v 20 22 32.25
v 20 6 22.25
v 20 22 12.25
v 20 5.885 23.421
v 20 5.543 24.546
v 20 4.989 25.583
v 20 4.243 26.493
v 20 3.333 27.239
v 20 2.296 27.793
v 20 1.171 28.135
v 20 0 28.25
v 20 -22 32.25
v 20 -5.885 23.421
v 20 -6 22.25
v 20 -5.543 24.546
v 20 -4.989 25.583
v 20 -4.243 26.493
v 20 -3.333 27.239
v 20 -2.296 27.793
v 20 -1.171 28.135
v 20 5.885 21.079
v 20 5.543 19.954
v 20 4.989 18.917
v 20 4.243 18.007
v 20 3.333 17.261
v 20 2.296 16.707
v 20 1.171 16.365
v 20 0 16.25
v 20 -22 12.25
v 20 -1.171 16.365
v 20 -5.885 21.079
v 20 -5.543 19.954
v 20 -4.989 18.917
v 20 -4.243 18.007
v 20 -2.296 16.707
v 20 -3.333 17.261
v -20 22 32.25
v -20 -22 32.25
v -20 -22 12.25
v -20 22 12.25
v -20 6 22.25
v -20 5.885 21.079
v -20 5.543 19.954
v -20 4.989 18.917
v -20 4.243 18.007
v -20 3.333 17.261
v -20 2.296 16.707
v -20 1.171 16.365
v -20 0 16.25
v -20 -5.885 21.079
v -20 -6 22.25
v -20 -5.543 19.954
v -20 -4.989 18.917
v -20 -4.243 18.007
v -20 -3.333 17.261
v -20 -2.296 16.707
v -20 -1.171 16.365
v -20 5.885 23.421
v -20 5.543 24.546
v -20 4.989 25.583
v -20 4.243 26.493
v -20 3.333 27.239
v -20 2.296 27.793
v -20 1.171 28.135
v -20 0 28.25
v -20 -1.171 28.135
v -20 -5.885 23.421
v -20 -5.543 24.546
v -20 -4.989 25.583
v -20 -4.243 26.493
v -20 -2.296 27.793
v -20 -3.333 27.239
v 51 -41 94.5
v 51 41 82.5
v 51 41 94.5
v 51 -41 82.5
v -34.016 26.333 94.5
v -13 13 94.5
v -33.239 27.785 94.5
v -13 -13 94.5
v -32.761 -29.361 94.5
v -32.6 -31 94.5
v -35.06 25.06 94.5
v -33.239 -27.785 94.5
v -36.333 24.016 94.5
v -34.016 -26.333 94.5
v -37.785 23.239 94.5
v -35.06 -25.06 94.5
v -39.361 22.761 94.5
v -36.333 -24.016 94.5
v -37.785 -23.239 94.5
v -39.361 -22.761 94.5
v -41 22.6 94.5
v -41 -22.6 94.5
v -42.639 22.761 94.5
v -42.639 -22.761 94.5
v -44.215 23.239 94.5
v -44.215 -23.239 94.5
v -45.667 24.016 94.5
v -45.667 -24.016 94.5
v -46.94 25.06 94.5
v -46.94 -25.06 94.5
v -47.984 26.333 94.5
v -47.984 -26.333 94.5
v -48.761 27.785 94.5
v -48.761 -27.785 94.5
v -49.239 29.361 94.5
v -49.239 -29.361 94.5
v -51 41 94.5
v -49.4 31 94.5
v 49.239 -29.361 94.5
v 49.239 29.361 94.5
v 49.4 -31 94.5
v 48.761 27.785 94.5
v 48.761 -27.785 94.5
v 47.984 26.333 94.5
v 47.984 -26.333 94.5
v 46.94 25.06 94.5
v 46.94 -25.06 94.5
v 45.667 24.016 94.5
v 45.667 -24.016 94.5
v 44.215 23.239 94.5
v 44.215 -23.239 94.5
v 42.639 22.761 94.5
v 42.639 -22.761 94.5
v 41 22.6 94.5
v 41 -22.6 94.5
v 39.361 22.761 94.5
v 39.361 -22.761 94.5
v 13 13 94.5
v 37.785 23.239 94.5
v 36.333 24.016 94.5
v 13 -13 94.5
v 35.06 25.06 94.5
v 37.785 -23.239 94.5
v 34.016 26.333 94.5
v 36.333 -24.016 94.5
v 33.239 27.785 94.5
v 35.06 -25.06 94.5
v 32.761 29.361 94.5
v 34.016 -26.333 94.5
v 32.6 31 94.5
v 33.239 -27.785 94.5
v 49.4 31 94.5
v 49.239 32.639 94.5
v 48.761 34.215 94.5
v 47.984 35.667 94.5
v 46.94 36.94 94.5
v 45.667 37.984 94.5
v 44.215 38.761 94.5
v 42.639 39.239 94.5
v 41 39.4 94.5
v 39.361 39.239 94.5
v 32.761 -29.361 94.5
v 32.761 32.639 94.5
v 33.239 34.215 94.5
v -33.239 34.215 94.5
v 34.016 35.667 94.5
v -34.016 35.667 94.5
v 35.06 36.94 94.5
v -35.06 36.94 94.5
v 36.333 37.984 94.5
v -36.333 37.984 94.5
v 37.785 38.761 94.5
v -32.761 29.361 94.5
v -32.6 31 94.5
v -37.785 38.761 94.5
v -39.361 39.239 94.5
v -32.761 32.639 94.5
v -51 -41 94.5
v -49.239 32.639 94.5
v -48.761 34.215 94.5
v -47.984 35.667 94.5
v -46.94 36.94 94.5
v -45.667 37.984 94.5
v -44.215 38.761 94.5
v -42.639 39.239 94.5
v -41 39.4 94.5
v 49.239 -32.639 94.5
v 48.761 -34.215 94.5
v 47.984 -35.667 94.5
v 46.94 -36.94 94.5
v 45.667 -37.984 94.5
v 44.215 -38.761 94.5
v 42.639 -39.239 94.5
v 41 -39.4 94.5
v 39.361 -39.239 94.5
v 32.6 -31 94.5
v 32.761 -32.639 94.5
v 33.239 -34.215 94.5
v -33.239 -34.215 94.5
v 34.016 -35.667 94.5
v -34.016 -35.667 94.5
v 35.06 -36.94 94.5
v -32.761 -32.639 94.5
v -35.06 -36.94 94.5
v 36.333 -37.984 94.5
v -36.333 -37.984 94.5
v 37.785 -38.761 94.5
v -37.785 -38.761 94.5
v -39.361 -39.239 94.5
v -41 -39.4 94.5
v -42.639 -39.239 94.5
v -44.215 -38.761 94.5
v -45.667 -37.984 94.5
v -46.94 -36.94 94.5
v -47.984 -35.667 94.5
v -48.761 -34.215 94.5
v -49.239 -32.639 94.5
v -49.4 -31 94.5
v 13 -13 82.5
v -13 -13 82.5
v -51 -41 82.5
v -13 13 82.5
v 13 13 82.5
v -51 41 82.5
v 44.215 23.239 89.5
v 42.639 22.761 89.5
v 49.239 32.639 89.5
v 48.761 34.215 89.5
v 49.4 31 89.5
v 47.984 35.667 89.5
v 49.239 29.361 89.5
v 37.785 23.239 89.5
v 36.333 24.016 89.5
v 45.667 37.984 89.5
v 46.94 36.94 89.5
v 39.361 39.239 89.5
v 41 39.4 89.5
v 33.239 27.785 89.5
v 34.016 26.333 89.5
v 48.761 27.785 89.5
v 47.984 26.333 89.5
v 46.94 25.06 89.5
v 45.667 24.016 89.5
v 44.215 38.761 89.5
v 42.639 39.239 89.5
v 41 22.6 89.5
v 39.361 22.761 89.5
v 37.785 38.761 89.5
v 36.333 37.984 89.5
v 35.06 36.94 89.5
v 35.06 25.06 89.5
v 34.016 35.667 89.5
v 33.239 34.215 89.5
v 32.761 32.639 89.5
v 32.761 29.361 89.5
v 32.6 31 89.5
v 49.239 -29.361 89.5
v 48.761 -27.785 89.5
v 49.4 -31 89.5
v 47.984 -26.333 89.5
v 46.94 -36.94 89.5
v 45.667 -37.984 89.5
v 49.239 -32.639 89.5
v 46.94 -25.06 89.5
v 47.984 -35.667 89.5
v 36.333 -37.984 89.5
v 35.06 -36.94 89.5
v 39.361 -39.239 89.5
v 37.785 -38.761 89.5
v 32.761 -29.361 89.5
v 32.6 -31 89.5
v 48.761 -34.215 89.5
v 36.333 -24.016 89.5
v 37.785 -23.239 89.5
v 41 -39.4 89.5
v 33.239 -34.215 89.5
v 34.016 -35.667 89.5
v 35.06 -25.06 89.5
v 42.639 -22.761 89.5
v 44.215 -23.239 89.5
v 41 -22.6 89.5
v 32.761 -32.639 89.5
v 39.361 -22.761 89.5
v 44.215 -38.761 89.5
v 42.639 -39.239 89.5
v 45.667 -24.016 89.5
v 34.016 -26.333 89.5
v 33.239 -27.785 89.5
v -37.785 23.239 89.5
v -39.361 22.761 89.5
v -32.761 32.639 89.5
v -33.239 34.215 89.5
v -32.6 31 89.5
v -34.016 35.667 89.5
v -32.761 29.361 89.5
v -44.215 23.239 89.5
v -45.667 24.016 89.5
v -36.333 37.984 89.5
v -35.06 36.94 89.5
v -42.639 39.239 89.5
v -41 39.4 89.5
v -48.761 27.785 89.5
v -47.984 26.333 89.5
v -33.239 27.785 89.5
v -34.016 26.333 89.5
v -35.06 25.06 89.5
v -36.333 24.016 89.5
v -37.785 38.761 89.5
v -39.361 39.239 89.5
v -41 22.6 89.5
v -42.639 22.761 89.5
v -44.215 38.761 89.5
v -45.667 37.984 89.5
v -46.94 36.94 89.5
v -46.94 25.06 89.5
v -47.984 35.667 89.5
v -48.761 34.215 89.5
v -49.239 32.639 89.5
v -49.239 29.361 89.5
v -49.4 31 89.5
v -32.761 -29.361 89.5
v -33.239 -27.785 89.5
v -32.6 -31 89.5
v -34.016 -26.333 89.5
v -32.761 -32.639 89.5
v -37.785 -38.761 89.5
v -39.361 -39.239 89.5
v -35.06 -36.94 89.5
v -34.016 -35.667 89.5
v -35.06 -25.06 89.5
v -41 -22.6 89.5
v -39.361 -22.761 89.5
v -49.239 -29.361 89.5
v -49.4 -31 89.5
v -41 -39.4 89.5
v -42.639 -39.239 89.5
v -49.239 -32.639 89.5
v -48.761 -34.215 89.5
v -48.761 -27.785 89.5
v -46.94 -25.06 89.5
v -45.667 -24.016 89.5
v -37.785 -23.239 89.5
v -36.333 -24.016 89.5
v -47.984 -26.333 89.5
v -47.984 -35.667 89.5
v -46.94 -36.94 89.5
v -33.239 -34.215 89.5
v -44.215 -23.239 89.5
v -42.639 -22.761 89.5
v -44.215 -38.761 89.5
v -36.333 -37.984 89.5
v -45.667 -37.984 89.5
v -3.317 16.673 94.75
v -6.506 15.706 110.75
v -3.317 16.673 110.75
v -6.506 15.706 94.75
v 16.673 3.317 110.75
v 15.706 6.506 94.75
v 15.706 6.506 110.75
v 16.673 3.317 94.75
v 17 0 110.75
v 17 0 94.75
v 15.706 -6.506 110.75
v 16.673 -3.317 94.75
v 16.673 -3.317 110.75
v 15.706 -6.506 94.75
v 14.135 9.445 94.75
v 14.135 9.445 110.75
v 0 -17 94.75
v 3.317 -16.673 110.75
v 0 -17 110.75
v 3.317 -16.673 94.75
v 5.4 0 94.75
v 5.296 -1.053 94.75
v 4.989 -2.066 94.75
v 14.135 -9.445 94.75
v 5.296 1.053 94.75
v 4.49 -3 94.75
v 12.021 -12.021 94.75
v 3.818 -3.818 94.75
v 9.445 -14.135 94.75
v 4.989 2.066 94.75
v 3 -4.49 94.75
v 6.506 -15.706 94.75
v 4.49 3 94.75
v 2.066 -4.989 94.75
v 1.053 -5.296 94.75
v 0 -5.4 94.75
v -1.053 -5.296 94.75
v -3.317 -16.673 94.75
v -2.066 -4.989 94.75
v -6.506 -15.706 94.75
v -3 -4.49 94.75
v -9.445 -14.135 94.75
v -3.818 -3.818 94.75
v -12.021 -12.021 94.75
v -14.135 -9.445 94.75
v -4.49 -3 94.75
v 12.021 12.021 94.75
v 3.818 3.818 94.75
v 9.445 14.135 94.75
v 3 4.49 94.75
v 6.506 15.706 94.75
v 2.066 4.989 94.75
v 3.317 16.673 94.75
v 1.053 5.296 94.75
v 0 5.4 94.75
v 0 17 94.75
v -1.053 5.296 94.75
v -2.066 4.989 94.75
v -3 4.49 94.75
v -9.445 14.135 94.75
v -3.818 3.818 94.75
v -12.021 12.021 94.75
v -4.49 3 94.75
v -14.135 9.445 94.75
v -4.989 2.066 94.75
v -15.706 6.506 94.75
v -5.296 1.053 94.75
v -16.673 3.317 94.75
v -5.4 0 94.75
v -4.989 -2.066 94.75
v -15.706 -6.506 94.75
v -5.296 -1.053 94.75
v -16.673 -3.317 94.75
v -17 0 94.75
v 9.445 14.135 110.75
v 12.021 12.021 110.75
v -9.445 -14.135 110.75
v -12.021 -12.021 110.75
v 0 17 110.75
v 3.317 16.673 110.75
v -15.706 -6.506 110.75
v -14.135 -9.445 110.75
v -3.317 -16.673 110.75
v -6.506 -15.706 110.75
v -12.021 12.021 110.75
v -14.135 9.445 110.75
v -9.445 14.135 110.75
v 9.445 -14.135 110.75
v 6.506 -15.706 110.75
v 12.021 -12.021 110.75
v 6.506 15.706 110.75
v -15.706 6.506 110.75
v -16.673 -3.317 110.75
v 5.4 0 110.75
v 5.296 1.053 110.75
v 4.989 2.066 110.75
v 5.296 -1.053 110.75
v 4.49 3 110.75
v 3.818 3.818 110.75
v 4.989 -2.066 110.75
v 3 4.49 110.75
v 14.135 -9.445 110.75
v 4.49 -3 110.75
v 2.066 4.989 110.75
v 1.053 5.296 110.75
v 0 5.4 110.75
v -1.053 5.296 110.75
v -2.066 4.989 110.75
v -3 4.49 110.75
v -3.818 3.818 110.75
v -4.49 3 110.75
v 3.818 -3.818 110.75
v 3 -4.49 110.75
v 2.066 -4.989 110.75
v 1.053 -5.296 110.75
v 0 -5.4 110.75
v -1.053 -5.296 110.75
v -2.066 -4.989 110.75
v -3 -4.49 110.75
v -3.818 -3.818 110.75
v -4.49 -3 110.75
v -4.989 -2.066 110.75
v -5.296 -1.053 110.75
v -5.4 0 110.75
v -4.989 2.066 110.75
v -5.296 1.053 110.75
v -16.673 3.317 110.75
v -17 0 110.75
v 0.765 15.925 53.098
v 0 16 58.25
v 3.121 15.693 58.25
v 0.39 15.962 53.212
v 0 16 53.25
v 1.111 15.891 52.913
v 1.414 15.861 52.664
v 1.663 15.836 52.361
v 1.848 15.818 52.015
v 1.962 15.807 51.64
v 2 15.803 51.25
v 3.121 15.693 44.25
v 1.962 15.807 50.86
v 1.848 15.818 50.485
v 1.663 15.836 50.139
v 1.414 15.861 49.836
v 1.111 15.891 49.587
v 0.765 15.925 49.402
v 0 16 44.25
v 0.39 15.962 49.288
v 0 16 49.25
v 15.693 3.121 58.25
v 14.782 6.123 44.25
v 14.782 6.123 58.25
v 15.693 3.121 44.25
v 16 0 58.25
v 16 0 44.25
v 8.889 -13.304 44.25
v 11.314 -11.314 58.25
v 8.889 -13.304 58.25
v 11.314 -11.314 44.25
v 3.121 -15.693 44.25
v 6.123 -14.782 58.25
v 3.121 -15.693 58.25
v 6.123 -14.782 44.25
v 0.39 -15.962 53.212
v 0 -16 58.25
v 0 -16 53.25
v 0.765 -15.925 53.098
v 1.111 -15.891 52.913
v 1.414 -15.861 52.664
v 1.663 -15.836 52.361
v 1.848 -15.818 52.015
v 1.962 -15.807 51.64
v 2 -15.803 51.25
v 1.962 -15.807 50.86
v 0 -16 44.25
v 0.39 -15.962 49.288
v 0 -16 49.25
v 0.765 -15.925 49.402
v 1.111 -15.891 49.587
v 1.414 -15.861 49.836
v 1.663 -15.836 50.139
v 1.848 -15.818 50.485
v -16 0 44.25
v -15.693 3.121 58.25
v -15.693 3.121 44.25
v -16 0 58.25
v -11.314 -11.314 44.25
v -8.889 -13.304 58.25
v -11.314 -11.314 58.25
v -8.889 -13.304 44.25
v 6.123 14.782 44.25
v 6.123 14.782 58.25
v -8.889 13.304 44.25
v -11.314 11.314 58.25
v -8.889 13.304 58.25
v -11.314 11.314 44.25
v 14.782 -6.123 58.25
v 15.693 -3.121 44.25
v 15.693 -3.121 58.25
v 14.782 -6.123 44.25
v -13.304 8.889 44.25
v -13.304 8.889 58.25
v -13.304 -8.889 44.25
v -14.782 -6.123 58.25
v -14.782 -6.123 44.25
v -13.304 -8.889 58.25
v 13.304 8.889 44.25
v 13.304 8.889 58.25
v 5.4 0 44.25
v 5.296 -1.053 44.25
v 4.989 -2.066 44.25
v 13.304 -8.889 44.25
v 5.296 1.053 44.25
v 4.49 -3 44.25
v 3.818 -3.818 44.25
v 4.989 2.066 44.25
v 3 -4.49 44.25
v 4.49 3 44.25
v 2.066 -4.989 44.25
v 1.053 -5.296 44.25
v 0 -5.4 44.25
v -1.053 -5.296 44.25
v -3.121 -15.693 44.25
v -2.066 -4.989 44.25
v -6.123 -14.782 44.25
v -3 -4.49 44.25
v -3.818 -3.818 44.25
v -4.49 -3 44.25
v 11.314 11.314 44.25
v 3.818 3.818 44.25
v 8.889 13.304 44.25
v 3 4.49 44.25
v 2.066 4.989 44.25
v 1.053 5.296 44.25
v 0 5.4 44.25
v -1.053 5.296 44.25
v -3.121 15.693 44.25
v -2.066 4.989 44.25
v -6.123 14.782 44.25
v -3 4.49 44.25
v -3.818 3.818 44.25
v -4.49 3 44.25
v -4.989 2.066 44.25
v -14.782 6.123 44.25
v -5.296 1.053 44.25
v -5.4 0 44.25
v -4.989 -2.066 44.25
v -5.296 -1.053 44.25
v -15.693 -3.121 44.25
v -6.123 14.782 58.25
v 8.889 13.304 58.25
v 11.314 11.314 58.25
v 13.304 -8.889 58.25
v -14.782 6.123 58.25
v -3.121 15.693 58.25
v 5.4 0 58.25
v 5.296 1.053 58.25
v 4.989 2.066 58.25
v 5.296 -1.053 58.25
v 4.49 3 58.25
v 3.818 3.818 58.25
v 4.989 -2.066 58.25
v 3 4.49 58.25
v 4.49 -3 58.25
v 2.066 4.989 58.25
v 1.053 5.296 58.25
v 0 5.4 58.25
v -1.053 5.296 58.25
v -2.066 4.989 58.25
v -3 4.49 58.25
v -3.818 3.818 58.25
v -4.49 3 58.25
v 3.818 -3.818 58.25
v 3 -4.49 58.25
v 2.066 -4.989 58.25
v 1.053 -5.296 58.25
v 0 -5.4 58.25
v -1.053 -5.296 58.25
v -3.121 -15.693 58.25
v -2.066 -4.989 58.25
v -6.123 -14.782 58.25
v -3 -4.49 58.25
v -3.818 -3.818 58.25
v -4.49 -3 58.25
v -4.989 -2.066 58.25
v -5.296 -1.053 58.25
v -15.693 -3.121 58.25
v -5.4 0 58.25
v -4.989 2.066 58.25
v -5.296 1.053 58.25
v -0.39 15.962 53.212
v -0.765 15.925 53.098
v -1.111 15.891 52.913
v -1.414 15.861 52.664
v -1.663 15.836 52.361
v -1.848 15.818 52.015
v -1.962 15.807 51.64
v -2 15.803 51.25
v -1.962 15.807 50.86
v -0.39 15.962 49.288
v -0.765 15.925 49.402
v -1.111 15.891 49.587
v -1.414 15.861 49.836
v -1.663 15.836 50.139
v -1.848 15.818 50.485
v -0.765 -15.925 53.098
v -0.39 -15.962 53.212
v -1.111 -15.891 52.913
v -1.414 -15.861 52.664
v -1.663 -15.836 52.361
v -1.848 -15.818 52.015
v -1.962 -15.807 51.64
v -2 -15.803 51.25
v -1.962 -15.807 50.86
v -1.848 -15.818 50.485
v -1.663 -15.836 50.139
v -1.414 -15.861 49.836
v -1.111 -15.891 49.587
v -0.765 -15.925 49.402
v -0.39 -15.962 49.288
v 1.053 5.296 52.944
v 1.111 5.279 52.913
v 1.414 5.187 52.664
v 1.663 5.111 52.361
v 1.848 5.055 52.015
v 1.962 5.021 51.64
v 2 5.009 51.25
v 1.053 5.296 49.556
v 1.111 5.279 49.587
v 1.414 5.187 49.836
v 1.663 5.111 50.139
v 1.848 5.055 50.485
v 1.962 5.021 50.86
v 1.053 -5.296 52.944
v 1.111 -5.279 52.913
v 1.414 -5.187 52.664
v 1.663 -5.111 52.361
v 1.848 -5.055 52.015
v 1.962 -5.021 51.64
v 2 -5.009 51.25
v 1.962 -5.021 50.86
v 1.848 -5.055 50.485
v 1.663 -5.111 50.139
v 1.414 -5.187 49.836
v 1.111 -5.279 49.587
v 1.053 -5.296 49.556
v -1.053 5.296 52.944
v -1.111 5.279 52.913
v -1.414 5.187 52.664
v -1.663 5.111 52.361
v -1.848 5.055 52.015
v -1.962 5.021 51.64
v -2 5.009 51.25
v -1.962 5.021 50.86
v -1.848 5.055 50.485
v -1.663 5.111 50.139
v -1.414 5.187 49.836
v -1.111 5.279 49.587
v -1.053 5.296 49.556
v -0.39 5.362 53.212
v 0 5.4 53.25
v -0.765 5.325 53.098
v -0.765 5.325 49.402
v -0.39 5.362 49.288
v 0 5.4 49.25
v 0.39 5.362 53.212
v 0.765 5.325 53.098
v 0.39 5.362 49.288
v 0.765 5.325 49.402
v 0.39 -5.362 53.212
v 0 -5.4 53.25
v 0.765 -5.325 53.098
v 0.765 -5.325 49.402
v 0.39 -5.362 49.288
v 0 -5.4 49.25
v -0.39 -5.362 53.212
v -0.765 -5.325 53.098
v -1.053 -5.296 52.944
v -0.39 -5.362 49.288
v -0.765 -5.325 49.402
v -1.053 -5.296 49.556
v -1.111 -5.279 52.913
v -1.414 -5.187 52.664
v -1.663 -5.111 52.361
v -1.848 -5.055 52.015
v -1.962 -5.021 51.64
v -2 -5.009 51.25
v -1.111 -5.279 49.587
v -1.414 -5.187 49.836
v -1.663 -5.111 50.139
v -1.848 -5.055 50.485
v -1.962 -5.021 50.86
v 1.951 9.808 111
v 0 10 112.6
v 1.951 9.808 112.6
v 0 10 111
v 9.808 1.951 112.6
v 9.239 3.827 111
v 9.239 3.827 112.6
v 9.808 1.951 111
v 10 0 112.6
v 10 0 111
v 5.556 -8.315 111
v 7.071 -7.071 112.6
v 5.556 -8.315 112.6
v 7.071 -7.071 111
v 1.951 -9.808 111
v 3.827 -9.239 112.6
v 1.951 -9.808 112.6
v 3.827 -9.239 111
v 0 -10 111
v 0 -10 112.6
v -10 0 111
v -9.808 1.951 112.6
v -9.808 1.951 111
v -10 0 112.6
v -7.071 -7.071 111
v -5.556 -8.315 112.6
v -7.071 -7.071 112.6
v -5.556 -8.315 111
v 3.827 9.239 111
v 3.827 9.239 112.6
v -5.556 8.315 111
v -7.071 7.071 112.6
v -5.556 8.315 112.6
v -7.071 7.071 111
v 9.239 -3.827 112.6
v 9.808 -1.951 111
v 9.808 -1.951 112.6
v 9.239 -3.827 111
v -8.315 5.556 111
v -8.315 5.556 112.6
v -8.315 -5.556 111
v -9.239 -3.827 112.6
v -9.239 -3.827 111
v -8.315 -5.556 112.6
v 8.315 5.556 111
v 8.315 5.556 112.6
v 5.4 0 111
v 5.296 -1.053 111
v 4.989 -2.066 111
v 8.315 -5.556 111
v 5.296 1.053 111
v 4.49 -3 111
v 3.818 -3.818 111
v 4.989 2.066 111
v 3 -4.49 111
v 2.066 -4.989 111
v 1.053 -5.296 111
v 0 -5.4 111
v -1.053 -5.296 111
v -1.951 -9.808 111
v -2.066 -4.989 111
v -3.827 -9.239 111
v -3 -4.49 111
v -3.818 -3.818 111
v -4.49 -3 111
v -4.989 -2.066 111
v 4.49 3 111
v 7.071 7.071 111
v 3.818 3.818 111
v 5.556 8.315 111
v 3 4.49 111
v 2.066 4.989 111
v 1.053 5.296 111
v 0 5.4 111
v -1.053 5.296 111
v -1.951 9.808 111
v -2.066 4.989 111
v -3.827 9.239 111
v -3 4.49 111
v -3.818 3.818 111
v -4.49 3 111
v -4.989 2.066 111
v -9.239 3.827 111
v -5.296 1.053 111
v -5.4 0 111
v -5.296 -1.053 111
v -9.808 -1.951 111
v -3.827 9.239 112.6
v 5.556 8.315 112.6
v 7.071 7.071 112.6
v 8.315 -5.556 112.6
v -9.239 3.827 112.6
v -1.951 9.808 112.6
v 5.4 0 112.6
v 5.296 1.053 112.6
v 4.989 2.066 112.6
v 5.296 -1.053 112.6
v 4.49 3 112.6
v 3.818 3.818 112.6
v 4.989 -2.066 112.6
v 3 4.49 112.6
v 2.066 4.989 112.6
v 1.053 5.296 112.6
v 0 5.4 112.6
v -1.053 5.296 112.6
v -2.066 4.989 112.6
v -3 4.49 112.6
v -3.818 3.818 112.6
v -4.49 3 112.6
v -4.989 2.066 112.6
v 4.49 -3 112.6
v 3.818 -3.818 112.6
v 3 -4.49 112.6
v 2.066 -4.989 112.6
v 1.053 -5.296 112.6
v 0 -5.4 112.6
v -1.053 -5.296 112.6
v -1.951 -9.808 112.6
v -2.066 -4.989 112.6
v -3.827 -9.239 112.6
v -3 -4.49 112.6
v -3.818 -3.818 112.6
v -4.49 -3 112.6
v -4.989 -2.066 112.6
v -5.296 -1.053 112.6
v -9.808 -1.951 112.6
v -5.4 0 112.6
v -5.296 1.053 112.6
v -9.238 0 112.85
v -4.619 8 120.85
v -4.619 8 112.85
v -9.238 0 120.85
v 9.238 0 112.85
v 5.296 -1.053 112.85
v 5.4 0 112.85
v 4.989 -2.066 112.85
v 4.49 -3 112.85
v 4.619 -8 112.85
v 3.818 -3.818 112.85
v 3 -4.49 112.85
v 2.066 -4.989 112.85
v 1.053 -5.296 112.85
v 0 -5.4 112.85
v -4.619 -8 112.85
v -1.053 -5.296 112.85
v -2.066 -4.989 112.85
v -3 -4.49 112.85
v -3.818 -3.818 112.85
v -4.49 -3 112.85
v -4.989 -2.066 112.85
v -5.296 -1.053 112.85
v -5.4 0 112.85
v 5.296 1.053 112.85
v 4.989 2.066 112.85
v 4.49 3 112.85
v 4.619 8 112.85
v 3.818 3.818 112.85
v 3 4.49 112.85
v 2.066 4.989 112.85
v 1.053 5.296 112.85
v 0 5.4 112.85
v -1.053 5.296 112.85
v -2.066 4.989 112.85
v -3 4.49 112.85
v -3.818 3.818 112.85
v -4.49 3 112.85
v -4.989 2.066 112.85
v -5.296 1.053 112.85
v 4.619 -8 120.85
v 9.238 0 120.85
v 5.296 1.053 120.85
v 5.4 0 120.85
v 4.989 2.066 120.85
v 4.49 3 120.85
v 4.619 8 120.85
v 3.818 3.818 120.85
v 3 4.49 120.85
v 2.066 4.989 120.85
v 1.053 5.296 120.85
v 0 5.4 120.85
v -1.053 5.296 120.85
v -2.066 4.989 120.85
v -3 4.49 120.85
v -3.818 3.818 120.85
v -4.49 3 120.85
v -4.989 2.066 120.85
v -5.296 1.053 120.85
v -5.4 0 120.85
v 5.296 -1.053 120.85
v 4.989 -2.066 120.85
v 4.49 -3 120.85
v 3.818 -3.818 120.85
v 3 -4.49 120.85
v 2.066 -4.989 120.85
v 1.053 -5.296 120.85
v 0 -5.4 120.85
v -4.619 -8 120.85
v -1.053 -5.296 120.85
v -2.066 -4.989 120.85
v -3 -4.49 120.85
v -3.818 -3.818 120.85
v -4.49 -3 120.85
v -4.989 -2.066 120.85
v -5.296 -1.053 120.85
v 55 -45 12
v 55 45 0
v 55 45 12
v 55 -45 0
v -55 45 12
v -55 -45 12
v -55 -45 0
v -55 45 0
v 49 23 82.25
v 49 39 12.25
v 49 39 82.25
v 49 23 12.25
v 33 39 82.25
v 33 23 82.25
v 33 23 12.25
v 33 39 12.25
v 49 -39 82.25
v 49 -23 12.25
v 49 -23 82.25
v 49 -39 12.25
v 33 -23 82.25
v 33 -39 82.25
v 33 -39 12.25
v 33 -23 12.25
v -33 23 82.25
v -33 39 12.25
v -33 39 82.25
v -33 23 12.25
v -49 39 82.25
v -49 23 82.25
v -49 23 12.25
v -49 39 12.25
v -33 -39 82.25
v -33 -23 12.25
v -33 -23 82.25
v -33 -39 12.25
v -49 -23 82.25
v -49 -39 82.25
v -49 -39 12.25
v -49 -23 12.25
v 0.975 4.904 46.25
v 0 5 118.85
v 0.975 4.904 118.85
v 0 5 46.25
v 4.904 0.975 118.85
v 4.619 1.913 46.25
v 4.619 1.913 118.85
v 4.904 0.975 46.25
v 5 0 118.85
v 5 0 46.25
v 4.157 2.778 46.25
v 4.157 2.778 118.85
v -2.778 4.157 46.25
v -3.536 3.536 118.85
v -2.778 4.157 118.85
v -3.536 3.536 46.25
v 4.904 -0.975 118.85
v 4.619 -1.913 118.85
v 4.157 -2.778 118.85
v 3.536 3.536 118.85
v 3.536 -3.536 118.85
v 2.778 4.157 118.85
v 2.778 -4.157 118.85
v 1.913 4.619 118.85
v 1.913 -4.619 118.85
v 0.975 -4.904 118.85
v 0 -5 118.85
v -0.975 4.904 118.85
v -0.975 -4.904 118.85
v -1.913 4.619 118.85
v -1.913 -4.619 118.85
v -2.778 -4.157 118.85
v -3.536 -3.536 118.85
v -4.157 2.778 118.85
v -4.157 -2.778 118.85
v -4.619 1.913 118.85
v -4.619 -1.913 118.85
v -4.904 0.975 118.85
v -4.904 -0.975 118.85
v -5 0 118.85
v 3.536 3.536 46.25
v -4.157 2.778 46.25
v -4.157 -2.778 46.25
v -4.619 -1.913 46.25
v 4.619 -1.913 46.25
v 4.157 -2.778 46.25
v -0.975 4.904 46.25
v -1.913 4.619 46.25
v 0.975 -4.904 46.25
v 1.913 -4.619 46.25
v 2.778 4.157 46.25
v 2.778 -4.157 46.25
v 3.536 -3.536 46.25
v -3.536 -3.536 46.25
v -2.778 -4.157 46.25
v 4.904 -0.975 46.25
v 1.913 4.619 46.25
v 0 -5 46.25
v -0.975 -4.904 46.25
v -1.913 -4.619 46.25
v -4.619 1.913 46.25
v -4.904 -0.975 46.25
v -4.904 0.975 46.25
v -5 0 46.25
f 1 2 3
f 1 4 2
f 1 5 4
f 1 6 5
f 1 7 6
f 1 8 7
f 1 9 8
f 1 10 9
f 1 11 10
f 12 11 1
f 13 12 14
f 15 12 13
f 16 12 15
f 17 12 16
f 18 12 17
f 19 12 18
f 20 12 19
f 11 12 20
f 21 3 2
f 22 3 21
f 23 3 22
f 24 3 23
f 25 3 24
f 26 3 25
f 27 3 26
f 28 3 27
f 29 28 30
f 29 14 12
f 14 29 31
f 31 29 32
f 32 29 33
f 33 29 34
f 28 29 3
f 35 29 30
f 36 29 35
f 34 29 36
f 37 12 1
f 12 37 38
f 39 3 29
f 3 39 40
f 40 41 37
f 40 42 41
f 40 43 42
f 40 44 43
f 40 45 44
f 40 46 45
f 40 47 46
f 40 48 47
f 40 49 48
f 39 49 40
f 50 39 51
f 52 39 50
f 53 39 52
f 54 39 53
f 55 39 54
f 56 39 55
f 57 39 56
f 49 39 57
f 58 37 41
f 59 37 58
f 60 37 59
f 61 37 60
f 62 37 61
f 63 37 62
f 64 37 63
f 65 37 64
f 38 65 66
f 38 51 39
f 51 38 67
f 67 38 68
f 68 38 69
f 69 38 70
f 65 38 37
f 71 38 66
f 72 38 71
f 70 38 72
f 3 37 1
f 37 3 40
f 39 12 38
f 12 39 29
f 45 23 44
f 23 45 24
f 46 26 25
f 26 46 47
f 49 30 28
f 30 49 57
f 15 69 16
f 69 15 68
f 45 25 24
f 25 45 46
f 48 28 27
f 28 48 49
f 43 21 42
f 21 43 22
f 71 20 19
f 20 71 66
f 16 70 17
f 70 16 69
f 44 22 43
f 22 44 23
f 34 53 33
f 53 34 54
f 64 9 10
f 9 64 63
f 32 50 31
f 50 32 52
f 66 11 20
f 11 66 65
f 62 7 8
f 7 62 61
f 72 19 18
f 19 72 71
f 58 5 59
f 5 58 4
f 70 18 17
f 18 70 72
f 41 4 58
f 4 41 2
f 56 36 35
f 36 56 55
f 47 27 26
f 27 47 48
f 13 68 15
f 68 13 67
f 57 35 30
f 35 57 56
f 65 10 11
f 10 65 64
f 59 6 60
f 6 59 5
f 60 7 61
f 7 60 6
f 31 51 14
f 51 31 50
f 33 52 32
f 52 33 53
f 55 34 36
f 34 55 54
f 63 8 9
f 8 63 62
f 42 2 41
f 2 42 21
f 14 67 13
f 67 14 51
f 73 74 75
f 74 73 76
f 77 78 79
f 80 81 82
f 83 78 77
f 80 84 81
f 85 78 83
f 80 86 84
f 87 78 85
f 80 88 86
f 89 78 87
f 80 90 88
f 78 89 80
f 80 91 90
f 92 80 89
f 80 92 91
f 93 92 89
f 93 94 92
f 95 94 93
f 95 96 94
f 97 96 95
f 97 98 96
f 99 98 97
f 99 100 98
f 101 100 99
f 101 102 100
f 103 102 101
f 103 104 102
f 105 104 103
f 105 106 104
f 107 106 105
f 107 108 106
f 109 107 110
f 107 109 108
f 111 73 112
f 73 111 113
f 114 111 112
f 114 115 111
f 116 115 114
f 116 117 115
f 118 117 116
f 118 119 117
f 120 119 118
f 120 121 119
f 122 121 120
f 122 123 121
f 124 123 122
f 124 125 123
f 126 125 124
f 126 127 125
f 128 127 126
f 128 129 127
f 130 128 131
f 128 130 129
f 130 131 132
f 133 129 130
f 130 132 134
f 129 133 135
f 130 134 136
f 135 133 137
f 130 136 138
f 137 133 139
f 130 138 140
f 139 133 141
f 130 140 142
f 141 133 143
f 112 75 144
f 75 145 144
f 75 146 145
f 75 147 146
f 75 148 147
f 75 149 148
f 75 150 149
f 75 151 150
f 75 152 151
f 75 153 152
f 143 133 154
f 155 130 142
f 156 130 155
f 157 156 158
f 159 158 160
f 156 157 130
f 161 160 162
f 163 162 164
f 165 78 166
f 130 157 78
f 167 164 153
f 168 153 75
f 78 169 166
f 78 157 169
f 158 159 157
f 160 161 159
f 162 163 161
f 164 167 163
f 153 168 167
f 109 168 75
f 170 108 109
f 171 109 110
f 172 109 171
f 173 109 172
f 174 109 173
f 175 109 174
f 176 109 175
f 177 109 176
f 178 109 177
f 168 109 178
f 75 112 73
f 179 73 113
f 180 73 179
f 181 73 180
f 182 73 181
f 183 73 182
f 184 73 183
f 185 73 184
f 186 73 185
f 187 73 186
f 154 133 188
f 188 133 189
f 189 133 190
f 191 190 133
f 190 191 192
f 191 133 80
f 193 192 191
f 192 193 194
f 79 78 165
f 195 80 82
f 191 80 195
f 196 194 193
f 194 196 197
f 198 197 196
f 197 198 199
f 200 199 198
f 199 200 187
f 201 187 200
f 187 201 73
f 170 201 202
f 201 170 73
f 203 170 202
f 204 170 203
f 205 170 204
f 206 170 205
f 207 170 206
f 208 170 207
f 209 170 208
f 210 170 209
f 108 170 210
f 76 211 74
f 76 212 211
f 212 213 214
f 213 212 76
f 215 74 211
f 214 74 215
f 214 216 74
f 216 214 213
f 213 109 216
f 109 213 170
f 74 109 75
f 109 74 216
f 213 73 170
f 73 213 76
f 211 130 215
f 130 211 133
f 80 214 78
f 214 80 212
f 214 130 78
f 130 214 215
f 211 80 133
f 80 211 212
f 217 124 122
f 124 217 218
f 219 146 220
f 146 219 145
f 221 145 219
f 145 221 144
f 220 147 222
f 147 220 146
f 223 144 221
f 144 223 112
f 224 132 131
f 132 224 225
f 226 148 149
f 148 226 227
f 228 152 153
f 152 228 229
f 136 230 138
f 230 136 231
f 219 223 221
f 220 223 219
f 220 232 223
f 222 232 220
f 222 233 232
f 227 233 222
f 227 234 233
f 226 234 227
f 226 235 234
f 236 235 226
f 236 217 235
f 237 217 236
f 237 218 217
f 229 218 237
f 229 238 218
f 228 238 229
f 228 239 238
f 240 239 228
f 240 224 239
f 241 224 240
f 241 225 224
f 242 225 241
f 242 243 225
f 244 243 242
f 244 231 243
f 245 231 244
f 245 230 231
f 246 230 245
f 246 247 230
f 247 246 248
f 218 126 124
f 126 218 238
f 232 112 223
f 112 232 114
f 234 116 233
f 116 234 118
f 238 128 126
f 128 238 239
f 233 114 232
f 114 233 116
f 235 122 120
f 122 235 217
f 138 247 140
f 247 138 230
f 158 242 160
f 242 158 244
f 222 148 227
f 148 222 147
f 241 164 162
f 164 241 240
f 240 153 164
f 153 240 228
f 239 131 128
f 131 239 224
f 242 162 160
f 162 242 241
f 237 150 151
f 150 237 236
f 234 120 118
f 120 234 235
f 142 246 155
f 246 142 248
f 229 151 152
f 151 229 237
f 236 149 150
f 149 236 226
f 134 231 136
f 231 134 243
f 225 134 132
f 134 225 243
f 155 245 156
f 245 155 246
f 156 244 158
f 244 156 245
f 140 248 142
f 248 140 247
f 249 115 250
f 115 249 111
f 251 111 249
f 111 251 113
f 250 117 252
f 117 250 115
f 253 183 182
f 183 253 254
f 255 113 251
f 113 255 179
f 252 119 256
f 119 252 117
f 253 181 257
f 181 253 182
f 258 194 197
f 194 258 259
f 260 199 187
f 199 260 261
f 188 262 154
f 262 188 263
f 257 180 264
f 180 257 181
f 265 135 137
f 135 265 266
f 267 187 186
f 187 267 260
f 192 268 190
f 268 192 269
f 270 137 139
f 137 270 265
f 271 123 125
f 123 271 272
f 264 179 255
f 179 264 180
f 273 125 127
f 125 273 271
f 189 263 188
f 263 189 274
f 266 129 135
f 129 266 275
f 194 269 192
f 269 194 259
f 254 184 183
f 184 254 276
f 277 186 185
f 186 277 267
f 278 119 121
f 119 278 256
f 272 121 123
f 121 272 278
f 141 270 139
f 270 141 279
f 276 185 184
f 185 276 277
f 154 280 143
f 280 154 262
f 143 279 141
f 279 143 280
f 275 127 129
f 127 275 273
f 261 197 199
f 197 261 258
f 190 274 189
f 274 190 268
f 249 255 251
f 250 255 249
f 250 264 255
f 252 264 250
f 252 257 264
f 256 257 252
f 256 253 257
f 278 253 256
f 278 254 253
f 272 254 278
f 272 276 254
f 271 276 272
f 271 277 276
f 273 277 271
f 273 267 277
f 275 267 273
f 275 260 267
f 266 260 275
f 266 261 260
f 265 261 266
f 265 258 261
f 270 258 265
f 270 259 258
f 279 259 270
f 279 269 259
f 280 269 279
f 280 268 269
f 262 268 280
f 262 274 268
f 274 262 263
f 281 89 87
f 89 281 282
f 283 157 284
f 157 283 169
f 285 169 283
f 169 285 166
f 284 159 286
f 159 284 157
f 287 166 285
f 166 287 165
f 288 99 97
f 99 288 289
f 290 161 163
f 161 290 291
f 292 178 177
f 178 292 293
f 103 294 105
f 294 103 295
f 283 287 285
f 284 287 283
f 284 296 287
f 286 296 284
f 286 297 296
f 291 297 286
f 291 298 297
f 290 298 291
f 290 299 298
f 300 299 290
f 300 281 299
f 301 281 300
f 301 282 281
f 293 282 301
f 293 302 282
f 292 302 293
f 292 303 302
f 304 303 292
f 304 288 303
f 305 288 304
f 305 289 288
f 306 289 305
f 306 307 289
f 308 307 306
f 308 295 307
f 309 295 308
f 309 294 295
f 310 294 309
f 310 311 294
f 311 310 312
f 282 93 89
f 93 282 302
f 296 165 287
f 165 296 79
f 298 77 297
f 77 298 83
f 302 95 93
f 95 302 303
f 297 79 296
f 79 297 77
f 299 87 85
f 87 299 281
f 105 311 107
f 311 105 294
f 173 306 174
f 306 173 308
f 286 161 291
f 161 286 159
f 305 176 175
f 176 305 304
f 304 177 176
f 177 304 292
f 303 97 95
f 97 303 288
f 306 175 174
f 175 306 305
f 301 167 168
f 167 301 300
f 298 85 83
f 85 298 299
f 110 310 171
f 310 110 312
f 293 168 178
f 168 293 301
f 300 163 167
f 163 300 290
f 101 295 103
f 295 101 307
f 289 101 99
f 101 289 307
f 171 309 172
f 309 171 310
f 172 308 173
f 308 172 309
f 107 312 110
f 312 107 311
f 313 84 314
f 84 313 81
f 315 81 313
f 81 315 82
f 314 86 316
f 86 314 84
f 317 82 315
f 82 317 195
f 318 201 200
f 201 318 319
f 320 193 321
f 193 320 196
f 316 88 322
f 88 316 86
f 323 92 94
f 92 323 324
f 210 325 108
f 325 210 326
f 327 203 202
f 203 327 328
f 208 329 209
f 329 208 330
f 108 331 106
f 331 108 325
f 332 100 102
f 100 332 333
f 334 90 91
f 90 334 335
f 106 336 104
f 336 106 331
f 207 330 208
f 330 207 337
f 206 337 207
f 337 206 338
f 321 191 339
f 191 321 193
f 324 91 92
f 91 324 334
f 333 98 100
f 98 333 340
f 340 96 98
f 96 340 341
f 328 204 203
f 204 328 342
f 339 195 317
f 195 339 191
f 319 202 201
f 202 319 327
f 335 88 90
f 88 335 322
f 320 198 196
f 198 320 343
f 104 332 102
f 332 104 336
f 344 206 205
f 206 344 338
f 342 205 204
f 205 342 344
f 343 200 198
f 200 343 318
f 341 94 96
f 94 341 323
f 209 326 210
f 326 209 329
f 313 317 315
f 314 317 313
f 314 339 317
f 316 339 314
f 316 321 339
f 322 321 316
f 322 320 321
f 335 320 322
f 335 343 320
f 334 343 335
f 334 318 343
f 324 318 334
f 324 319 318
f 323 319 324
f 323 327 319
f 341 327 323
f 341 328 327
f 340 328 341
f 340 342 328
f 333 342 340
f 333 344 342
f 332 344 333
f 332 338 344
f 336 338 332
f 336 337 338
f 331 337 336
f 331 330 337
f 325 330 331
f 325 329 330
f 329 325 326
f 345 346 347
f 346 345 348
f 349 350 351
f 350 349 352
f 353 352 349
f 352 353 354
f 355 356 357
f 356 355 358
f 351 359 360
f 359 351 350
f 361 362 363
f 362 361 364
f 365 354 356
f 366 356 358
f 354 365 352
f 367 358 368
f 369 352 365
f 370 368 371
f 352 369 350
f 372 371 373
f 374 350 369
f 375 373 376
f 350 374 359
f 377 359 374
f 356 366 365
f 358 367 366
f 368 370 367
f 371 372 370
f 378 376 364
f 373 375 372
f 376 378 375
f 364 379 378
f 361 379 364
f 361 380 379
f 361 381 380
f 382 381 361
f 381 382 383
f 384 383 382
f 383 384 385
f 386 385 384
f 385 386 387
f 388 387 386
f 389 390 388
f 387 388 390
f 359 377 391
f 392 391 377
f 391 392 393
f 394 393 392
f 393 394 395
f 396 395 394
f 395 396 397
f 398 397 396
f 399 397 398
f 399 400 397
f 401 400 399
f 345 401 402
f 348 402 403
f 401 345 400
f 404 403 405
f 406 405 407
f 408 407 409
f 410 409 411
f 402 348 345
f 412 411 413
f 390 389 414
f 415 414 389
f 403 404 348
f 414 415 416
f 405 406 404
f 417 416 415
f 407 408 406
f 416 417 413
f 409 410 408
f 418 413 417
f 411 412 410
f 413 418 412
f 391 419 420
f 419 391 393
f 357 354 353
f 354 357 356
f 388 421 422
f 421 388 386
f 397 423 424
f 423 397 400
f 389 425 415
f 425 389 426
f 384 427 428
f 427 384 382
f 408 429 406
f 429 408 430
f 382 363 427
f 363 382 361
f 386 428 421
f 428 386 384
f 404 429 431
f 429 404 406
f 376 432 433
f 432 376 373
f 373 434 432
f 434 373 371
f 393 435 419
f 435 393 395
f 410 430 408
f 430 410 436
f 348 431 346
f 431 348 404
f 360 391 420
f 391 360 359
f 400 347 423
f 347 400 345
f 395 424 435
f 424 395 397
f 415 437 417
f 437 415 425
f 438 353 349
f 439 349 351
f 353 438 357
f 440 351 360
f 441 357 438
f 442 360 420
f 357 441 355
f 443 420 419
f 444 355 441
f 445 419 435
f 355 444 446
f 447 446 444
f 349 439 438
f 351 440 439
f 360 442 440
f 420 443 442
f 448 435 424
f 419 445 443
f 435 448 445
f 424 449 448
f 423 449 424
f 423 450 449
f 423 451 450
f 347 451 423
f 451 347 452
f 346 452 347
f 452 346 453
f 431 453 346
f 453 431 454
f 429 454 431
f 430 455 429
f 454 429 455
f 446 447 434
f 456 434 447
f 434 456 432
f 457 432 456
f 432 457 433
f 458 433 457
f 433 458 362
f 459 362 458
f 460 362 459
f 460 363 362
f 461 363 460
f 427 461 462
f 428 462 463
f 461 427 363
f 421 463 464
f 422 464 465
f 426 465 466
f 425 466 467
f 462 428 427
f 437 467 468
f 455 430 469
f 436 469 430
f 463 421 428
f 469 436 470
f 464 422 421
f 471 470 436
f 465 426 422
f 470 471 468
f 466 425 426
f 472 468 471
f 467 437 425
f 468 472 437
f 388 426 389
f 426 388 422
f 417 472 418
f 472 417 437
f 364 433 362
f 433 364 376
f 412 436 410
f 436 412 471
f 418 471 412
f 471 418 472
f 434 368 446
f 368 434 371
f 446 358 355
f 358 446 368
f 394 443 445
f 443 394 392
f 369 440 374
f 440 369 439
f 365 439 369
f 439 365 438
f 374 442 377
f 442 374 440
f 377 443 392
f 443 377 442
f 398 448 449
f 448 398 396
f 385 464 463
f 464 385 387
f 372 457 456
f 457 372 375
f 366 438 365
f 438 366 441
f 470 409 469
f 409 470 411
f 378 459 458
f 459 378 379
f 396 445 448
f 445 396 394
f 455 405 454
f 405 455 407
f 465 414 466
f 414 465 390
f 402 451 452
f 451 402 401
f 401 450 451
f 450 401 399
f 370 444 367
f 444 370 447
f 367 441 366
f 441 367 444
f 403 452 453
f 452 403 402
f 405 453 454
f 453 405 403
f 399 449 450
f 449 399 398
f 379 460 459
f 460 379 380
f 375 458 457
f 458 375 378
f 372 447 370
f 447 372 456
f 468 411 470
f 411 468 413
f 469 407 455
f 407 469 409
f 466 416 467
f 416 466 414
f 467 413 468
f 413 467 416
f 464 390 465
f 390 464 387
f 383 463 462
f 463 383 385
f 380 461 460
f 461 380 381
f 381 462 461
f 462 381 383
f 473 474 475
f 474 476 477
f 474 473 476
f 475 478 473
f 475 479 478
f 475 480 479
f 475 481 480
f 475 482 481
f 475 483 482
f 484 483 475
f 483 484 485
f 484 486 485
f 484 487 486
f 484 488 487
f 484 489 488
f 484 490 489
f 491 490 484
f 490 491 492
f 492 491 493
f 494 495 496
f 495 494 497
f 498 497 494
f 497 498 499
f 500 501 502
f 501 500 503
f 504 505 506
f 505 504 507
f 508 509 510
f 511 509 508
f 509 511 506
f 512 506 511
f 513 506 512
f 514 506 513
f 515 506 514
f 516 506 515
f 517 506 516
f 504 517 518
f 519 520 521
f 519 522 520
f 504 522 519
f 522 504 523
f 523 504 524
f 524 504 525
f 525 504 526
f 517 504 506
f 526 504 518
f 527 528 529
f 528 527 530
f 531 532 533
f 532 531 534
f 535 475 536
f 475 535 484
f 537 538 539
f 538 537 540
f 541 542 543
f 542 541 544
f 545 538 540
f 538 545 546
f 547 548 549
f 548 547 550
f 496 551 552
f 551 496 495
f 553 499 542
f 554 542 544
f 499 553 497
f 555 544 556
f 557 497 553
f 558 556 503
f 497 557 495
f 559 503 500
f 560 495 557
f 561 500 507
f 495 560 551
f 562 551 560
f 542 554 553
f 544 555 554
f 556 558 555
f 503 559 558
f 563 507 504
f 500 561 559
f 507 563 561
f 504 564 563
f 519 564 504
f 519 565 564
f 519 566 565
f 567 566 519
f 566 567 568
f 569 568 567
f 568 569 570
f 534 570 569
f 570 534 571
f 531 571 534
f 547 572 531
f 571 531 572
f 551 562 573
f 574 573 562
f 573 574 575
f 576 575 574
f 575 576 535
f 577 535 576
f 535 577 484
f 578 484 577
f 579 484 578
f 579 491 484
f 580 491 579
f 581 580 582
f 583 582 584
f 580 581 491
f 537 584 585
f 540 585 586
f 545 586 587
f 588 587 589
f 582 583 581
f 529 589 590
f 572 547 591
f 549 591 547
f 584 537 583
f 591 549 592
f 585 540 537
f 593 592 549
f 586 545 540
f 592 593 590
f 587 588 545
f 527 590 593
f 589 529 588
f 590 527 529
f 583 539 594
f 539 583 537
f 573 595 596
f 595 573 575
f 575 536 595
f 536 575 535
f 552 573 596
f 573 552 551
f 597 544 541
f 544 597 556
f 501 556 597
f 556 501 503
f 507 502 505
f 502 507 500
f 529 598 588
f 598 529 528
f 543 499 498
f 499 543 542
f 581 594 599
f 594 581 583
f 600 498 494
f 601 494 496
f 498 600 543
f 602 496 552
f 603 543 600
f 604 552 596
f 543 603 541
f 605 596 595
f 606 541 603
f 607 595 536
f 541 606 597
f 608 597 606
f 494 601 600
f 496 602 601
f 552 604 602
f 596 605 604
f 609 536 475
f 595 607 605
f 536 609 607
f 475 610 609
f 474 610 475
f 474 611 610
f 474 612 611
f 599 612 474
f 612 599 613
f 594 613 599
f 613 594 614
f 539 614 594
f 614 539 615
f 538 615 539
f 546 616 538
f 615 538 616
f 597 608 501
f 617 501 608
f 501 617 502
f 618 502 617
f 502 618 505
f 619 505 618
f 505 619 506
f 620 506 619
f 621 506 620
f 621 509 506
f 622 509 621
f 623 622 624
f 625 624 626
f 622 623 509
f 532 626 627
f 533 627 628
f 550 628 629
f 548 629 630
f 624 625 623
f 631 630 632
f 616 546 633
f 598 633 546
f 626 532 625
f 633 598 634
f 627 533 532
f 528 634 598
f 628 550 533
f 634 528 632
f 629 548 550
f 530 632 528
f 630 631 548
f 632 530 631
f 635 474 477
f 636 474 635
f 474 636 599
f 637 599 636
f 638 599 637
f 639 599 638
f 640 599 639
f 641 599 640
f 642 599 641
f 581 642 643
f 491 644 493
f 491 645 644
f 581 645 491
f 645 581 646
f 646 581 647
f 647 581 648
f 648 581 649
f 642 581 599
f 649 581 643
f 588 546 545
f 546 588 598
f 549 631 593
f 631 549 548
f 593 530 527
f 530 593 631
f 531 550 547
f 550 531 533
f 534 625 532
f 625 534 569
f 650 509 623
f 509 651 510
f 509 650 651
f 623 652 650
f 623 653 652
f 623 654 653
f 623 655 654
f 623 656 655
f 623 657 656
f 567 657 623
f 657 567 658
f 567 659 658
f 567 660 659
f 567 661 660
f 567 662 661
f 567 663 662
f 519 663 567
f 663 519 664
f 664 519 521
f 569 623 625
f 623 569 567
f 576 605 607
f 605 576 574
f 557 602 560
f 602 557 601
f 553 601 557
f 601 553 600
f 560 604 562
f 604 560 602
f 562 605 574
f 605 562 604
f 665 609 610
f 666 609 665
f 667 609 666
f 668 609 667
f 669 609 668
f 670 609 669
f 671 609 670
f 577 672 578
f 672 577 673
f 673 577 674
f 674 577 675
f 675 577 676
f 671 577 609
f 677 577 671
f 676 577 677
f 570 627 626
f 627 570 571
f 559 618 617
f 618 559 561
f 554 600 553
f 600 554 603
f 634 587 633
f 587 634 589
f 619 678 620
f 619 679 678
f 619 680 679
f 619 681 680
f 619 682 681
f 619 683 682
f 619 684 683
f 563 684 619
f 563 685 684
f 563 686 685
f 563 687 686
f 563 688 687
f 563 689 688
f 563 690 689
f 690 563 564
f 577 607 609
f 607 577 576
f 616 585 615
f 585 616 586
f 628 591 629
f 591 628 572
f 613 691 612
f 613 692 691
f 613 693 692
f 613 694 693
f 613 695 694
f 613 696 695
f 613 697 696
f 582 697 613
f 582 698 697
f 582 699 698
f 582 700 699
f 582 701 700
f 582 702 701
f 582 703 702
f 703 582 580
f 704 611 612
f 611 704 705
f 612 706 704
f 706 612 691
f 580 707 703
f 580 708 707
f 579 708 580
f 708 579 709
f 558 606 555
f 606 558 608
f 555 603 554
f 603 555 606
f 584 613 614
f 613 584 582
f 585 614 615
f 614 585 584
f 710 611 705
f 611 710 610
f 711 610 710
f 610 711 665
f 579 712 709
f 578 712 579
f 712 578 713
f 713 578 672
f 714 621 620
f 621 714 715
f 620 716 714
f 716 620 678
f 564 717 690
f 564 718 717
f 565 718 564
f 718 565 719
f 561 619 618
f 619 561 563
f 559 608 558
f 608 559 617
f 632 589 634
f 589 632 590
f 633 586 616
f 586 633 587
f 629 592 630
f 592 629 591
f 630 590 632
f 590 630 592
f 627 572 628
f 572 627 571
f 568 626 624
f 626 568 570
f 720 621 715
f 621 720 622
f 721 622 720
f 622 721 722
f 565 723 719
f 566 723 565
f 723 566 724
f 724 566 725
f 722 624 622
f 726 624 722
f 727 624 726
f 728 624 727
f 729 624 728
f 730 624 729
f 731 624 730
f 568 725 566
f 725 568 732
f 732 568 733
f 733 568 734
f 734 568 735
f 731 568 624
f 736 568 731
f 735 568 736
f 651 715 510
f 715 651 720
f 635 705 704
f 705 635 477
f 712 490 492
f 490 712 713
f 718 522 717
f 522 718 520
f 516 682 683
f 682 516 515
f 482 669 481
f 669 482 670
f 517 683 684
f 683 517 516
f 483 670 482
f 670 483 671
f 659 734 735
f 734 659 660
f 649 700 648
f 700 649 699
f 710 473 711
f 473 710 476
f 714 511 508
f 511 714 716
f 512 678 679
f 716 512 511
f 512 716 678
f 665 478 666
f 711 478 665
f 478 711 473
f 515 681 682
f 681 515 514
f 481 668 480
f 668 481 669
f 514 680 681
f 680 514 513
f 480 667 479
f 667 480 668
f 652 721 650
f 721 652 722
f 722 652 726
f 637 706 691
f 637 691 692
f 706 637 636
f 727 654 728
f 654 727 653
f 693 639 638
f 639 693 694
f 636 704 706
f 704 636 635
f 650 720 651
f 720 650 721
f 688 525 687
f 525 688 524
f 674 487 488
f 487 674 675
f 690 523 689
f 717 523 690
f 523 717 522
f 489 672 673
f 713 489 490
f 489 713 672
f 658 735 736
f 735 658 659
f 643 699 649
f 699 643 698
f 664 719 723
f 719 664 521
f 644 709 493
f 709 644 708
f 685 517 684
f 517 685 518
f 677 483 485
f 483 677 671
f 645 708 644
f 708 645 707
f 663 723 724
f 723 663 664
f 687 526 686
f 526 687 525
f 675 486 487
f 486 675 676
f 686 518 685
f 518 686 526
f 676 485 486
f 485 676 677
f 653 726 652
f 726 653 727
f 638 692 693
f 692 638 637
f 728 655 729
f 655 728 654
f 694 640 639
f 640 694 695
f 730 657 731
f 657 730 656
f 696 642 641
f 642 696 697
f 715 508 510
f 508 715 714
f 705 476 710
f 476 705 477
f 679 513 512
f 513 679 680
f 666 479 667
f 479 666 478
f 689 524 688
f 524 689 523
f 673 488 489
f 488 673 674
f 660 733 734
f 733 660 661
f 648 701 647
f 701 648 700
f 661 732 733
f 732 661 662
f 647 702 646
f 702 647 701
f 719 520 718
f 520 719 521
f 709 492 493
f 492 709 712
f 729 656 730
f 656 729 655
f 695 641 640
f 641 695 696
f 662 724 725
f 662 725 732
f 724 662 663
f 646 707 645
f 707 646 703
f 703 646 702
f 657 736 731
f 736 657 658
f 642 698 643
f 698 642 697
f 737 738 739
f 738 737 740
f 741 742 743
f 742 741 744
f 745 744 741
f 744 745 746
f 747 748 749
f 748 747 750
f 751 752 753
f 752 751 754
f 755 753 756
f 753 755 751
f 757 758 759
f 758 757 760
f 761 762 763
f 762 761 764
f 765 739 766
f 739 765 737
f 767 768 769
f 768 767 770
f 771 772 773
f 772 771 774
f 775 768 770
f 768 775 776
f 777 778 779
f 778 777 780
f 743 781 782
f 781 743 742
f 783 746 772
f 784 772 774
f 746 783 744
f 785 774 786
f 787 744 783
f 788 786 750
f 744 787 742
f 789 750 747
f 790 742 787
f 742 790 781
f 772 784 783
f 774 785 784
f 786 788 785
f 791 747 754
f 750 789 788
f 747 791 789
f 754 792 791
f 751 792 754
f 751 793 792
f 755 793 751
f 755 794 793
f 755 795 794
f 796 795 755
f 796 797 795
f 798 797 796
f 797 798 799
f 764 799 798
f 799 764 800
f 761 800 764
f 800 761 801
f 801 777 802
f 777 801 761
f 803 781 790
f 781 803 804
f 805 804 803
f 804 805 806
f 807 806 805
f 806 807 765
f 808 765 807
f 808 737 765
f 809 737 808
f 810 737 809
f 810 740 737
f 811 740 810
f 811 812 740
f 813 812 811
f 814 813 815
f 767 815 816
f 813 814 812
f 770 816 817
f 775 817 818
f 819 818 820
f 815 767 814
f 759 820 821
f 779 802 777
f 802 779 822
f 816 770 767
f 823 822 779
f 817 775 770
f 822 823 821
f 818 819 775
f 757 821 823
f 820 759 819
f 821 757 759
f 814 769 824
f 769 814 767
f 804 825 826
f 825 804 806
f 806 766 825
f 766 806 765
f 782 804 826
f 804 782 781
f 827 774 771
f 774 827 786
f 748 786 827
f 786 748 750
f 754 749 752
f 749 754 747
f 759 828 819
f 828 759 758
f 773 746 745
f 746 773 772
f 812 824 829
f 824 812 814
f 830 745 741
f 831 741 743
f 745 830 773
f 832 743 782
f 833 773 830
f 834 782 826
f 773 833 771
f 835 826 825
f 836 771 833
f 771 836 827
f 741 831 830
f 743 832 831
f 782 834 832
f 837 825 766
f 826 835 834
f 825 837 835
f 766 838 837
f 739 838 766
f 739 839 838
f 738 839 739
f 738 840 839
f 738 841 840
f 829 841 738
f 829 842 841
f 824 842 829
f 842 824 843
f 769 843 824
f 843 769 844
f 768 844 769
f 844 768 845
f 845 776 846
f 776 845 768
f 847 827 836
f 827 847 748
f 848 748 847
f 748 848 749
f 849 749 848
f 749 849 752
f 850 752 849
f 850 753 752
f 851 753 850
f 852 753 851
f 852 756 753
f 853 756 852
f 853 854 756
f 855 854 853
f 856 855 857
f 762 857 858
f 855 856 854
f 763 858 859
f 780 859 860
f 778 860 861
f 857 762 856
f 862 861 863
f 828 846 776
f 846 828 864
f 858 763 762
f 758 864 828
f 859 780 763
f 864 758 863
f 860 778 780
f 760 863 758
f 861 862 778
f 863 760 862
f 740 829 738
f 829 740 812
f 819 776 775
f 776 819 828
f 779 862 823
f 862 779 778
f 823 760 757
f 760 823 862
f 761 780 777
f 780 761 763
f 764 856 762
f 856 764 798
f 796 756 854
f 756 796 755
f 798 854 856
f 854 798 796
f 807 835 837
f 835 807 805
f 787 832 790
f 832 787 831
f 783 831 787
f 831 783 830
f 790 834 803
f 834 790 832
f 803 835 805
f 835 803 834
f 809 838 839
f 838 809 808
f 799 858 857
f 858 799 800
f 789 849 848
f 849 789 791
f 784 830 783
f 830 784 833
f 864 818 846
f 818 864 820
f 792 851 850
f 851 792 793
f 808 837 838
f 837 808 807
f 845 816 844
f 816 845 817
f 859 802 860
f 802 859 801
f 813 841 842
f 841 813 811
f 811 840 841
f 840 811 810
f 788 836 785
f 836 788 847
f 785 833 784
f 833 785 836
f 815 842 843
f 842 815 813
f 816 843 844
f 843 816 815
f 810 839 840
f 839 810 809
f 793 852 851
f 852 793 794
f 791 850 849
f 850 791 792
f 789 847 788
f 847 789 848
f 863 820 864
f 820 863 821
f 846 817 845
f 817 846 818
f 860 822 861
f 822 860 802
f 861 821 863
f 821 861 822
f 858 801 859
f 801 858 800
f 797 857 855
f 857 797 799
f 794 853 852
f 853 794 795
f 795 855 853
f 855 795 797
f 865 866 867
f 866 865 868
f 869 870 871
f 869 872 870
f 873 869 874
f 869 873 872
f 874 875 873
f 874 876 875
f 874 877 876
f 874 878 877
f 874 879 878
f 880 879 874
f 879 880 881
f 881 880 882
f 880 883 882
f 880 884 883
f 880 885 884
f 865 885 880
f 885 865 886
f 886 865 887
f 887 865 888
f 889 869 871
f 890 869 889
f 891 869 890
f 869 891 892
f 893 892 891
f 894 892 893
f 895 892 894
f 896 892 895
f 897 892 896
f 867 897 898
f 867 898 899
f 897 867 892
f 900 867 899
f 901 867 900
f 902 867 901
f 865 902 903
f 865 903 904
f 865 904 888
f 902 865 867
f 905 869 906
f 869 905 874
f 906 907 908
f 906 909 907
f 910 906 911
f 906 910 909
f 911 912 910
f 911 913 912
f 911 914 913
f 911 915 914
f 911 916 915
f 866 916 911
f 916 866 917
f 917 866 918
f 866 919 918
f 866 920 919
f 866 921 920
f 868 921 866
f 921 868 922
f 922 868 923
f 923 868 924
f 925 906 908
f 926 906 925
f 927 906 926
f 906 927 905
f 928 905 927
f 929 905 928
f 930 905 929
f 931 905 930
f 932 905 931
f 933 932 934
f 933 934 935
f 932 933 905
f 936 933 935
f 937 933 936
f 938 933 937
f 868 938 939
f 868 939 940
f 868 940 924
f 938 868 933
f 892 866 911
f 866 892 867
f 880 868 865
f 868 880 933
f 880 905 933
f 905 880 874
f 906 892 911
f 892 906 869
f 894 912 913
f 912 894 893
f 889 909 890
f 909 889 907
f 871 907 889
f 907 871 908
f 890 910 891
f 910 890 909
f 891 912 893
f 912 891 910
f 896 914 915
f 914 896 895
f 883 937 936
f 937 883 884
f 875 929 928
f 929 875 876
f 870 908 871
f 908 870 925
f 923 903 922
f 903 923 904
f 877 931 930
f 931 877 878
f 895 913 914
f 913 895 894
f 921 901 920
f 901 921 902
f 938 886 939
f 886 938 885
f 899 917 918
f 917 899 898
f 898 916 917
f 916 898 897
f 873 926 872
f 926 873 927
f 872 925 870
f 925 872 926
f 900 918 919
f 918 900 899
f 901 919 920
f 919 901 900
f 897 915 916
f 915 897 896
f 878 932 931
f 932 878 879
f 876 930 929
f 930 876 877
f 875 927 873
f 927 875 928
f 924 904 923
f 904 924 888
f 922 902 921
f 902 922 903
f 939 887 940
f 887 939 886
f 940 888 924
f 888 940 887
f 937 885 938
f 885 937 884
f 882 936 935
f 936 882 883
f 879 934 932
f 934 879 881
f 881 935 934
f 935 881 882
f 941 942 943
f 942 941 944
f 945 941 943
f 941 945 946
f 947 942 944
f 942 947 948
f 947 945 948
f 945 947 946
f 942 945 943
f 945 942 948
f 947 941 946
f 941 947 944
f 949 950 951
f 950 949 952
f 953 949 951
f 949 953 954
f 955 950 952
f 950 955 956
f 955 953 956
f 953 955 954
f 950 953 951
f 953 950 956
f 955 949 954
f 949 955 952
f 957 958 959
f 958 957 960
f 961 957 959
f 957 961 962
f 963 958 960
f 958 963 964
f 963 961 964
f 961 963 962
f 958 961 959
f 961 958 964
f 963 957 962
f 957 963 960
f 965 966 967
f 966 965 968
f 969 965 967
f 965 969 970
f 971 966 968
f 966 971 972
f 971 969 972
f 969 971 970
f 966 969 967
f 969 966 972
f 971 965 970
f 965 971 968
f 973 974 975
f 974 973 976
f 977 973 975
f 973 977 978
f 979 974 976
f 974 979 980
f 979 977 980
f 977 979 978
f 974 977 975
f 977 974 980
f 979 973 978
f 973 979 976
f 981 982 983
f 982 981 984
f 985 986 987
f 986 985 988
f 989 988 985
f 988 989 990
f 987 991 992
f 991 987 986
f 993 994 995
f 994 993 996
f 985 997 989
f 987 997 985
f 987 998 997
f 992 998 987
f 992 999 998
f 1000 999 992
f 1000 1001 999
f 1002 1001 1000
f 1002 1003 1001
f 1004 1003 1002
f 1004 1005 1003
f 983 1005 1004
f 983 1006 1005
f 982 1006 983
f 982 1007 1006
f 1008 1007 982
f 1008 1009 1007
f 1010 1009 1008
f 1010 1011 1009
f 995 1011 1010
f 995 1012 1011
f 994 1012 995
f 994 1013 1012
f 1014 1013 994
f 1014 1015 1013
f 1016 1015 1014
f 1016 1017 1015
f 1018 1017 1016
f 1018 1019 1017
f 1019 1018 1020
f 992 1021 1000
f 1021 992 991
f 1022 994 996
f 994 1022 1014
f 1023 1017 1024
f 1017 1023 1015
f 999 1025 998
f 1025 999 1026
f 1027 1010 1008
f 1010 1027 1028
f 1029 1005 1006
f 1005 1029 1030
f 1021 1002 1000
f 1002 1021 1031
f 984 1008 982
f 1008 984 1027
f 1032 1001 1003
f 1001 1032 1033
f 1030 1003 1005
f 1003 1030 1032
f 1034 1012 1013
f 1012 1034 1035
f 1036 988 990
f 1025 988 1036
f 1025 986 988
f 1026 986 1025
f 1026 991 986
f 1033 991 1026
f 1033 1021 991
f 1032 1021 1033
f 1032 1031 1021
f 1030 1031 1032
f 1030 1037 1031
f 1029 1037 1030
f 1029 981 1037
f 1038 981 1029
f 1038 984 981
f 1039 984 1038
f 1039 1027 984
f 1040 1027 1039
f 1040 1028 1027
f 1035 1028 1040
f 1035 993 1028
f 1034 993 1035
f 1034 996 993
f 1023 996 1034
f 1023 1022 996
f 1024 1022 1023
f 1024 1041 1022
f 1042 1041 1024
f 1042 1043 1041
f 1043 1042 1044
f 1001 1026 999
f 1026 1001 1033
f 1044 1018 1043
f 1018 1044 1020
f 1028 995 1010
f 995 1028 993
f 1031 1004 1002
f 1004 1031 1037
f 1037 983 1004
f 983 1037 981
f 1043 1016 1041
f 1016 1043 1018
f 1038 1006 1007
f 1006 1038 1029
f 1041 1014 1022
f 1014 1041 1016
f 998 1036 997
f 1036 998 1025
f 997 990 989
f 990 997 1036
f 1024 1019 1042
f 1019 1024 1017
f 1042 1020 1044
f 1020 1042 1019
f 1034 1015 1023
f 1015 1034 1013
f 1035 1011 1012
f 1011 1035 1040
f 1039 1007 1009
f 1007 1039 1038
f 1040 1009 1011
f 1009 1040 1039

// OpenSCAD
$fn = 32;

// ------------------------------------------------------------------------
// Arbor press fixture: screw d10, posts 70 mm, gap 12 mm
// Every part is its own module, assembly() places every instance.
// ------------------------------------------------------------------------

// --- part 1 ---
module press_bed() {
  difference() {
    translate([-55, -45, 0]) cube([110, 90, 12]);
  }
}

// --- part 2 ---
module anvil_block() {
  difference() {
    translate([-20, -22, 0]) cube([40, 44, 20]);
    translate([0, 0, 10]) rotate([0, 90, 0]) cylinder(h = 42, d = 12, center = true);
  }
}

// --- part 3 ---
module press_post_a() {
  translate([-8, -8, 0]) cube([16, 16, 70]);
}

// --- part 4 ---
module press_post_b() {
  translate([-8, -8, 0]) cube([16, 16, 70]);
}

// --- part 5 ---
module press_post_c() {
  translate([-8, -8, 0]) cube([16, 16, 70]);
}

// --- part 6 ---
module press_post_d() {
  translate([-8, -8, 0]) cube([16, 16, 70]);
}

// --- part 7 ---
module press_frame() {
  difference() {
    translate([-51, -41, 0]) cube([102, 82, 12]);
    translate([-13, -13, -1]) cube([26, 26, 14]);
    translate([41, 31, 7]) cylinder(h = 6, d = 16.8);
    translate([41, -31, 7]) cylinder(h = 6, d = 16.8);
    translate([-41, 31, 7]) cylinder(h = 6, d = 16.8);
    translate([-41, -31, 7]) cylinder(h = 6, d = 16.8);
  }
}

// --- part 8 ---
module guide_ring() {
  difference() {
      translate([0, 0, 0]) cylinder(h = 16, d = 34);
      translate([0, 0, -1]) cylinder(h = 18, d = 10.8);
    }
}

// --- part 9 ---
module press_screw() {
  translate([0, 0, -36.3]) cylinder(h = 72.6, d = 10);
}

// --- part 10 ---
module press_head() {
  difference() {
    cylinder(h = 14, d = 32);
    translate([0, 0, -1]) cylinder(h = 16, d = 10.8);
    translate([0, 0, 7]) rotate([90, 0, 0]) cylinder(h = 34, d = 4, center = true);
  }
}

// --- part 11 ---
module nut_washer() {
  difference() {
      translate([0, 0, 0]) cylinder(h = 1.6, d = 20);
      translate([0, 0, -1]) cylinder(h = 3.6, d = 10.8);
    }
}

// --- part 12 ---
module press_nut() {
  difference() {
    linear_extrude(height = 8) polygon(points = [[9.238, 0], [4.619, 8], [-4.619, 8], [-9.238, 0], [-4.619, -8], [4.619, -8]]);
    translate([0, 0, -1]) cylinder(h = 10, d = 10.8);
  }
}

// --- assembly ---
module assembly() {
  color([0.80, 0.24, 0.20]) translate([0, 0, 0]) rotate([0, 0, 0]) press_bed();
  color([0.20, 0.45, 0.75]) translate([0, 0, 12.25]) rotate([0, 0, 0]) anvil_block();
  color([0.25, 0.62, 0.32]) translate([41, 31, 12.25]) rotate([0, 0, 0]) press_post_a();
  color([0.92, 0.70, 0.18]) translate([41, -31, 12.25]) rotate([0, 0, 0]) press_post_b();
  color([0.58, 0.35, 0.70]) translate([-41, 31, 12.25]) rotate([0, 0, 0]) press_post_c();
  color([0.16, 0.66, 0.66]) translate([-41, -31, 12.25]) rotate([0, 0, 0]) press_post_d();
  color([0.85, 0.48, 0.18]) translate([0, 0, 82.5]) rotate([0, 0, 0]) press_frame();
  color([0.55, 0.60, 0.65]) translate([0, 0, 94.75]) rotate([0, 0, 0]) guide_ring();
  color([0.75, 0.30, 0.55]) translate([0, 0, 82.55]) rotate([0, 0, 0]) press_screw();
  color([0.42, 0.52, 0.28]) translate([0, 0, 44.25]) rotate([0, 0, 0]) press_head();
  color([0.80, 0.24, 0.20]) translate([0, 0, 111]) rotate([0, 0, 0]) nut_washer();
  color([0.20, 0.45, 0.75]) translate([0, 0, 112.85]) rotate([0, 0, 0]) press_nut();
}

assembly();
